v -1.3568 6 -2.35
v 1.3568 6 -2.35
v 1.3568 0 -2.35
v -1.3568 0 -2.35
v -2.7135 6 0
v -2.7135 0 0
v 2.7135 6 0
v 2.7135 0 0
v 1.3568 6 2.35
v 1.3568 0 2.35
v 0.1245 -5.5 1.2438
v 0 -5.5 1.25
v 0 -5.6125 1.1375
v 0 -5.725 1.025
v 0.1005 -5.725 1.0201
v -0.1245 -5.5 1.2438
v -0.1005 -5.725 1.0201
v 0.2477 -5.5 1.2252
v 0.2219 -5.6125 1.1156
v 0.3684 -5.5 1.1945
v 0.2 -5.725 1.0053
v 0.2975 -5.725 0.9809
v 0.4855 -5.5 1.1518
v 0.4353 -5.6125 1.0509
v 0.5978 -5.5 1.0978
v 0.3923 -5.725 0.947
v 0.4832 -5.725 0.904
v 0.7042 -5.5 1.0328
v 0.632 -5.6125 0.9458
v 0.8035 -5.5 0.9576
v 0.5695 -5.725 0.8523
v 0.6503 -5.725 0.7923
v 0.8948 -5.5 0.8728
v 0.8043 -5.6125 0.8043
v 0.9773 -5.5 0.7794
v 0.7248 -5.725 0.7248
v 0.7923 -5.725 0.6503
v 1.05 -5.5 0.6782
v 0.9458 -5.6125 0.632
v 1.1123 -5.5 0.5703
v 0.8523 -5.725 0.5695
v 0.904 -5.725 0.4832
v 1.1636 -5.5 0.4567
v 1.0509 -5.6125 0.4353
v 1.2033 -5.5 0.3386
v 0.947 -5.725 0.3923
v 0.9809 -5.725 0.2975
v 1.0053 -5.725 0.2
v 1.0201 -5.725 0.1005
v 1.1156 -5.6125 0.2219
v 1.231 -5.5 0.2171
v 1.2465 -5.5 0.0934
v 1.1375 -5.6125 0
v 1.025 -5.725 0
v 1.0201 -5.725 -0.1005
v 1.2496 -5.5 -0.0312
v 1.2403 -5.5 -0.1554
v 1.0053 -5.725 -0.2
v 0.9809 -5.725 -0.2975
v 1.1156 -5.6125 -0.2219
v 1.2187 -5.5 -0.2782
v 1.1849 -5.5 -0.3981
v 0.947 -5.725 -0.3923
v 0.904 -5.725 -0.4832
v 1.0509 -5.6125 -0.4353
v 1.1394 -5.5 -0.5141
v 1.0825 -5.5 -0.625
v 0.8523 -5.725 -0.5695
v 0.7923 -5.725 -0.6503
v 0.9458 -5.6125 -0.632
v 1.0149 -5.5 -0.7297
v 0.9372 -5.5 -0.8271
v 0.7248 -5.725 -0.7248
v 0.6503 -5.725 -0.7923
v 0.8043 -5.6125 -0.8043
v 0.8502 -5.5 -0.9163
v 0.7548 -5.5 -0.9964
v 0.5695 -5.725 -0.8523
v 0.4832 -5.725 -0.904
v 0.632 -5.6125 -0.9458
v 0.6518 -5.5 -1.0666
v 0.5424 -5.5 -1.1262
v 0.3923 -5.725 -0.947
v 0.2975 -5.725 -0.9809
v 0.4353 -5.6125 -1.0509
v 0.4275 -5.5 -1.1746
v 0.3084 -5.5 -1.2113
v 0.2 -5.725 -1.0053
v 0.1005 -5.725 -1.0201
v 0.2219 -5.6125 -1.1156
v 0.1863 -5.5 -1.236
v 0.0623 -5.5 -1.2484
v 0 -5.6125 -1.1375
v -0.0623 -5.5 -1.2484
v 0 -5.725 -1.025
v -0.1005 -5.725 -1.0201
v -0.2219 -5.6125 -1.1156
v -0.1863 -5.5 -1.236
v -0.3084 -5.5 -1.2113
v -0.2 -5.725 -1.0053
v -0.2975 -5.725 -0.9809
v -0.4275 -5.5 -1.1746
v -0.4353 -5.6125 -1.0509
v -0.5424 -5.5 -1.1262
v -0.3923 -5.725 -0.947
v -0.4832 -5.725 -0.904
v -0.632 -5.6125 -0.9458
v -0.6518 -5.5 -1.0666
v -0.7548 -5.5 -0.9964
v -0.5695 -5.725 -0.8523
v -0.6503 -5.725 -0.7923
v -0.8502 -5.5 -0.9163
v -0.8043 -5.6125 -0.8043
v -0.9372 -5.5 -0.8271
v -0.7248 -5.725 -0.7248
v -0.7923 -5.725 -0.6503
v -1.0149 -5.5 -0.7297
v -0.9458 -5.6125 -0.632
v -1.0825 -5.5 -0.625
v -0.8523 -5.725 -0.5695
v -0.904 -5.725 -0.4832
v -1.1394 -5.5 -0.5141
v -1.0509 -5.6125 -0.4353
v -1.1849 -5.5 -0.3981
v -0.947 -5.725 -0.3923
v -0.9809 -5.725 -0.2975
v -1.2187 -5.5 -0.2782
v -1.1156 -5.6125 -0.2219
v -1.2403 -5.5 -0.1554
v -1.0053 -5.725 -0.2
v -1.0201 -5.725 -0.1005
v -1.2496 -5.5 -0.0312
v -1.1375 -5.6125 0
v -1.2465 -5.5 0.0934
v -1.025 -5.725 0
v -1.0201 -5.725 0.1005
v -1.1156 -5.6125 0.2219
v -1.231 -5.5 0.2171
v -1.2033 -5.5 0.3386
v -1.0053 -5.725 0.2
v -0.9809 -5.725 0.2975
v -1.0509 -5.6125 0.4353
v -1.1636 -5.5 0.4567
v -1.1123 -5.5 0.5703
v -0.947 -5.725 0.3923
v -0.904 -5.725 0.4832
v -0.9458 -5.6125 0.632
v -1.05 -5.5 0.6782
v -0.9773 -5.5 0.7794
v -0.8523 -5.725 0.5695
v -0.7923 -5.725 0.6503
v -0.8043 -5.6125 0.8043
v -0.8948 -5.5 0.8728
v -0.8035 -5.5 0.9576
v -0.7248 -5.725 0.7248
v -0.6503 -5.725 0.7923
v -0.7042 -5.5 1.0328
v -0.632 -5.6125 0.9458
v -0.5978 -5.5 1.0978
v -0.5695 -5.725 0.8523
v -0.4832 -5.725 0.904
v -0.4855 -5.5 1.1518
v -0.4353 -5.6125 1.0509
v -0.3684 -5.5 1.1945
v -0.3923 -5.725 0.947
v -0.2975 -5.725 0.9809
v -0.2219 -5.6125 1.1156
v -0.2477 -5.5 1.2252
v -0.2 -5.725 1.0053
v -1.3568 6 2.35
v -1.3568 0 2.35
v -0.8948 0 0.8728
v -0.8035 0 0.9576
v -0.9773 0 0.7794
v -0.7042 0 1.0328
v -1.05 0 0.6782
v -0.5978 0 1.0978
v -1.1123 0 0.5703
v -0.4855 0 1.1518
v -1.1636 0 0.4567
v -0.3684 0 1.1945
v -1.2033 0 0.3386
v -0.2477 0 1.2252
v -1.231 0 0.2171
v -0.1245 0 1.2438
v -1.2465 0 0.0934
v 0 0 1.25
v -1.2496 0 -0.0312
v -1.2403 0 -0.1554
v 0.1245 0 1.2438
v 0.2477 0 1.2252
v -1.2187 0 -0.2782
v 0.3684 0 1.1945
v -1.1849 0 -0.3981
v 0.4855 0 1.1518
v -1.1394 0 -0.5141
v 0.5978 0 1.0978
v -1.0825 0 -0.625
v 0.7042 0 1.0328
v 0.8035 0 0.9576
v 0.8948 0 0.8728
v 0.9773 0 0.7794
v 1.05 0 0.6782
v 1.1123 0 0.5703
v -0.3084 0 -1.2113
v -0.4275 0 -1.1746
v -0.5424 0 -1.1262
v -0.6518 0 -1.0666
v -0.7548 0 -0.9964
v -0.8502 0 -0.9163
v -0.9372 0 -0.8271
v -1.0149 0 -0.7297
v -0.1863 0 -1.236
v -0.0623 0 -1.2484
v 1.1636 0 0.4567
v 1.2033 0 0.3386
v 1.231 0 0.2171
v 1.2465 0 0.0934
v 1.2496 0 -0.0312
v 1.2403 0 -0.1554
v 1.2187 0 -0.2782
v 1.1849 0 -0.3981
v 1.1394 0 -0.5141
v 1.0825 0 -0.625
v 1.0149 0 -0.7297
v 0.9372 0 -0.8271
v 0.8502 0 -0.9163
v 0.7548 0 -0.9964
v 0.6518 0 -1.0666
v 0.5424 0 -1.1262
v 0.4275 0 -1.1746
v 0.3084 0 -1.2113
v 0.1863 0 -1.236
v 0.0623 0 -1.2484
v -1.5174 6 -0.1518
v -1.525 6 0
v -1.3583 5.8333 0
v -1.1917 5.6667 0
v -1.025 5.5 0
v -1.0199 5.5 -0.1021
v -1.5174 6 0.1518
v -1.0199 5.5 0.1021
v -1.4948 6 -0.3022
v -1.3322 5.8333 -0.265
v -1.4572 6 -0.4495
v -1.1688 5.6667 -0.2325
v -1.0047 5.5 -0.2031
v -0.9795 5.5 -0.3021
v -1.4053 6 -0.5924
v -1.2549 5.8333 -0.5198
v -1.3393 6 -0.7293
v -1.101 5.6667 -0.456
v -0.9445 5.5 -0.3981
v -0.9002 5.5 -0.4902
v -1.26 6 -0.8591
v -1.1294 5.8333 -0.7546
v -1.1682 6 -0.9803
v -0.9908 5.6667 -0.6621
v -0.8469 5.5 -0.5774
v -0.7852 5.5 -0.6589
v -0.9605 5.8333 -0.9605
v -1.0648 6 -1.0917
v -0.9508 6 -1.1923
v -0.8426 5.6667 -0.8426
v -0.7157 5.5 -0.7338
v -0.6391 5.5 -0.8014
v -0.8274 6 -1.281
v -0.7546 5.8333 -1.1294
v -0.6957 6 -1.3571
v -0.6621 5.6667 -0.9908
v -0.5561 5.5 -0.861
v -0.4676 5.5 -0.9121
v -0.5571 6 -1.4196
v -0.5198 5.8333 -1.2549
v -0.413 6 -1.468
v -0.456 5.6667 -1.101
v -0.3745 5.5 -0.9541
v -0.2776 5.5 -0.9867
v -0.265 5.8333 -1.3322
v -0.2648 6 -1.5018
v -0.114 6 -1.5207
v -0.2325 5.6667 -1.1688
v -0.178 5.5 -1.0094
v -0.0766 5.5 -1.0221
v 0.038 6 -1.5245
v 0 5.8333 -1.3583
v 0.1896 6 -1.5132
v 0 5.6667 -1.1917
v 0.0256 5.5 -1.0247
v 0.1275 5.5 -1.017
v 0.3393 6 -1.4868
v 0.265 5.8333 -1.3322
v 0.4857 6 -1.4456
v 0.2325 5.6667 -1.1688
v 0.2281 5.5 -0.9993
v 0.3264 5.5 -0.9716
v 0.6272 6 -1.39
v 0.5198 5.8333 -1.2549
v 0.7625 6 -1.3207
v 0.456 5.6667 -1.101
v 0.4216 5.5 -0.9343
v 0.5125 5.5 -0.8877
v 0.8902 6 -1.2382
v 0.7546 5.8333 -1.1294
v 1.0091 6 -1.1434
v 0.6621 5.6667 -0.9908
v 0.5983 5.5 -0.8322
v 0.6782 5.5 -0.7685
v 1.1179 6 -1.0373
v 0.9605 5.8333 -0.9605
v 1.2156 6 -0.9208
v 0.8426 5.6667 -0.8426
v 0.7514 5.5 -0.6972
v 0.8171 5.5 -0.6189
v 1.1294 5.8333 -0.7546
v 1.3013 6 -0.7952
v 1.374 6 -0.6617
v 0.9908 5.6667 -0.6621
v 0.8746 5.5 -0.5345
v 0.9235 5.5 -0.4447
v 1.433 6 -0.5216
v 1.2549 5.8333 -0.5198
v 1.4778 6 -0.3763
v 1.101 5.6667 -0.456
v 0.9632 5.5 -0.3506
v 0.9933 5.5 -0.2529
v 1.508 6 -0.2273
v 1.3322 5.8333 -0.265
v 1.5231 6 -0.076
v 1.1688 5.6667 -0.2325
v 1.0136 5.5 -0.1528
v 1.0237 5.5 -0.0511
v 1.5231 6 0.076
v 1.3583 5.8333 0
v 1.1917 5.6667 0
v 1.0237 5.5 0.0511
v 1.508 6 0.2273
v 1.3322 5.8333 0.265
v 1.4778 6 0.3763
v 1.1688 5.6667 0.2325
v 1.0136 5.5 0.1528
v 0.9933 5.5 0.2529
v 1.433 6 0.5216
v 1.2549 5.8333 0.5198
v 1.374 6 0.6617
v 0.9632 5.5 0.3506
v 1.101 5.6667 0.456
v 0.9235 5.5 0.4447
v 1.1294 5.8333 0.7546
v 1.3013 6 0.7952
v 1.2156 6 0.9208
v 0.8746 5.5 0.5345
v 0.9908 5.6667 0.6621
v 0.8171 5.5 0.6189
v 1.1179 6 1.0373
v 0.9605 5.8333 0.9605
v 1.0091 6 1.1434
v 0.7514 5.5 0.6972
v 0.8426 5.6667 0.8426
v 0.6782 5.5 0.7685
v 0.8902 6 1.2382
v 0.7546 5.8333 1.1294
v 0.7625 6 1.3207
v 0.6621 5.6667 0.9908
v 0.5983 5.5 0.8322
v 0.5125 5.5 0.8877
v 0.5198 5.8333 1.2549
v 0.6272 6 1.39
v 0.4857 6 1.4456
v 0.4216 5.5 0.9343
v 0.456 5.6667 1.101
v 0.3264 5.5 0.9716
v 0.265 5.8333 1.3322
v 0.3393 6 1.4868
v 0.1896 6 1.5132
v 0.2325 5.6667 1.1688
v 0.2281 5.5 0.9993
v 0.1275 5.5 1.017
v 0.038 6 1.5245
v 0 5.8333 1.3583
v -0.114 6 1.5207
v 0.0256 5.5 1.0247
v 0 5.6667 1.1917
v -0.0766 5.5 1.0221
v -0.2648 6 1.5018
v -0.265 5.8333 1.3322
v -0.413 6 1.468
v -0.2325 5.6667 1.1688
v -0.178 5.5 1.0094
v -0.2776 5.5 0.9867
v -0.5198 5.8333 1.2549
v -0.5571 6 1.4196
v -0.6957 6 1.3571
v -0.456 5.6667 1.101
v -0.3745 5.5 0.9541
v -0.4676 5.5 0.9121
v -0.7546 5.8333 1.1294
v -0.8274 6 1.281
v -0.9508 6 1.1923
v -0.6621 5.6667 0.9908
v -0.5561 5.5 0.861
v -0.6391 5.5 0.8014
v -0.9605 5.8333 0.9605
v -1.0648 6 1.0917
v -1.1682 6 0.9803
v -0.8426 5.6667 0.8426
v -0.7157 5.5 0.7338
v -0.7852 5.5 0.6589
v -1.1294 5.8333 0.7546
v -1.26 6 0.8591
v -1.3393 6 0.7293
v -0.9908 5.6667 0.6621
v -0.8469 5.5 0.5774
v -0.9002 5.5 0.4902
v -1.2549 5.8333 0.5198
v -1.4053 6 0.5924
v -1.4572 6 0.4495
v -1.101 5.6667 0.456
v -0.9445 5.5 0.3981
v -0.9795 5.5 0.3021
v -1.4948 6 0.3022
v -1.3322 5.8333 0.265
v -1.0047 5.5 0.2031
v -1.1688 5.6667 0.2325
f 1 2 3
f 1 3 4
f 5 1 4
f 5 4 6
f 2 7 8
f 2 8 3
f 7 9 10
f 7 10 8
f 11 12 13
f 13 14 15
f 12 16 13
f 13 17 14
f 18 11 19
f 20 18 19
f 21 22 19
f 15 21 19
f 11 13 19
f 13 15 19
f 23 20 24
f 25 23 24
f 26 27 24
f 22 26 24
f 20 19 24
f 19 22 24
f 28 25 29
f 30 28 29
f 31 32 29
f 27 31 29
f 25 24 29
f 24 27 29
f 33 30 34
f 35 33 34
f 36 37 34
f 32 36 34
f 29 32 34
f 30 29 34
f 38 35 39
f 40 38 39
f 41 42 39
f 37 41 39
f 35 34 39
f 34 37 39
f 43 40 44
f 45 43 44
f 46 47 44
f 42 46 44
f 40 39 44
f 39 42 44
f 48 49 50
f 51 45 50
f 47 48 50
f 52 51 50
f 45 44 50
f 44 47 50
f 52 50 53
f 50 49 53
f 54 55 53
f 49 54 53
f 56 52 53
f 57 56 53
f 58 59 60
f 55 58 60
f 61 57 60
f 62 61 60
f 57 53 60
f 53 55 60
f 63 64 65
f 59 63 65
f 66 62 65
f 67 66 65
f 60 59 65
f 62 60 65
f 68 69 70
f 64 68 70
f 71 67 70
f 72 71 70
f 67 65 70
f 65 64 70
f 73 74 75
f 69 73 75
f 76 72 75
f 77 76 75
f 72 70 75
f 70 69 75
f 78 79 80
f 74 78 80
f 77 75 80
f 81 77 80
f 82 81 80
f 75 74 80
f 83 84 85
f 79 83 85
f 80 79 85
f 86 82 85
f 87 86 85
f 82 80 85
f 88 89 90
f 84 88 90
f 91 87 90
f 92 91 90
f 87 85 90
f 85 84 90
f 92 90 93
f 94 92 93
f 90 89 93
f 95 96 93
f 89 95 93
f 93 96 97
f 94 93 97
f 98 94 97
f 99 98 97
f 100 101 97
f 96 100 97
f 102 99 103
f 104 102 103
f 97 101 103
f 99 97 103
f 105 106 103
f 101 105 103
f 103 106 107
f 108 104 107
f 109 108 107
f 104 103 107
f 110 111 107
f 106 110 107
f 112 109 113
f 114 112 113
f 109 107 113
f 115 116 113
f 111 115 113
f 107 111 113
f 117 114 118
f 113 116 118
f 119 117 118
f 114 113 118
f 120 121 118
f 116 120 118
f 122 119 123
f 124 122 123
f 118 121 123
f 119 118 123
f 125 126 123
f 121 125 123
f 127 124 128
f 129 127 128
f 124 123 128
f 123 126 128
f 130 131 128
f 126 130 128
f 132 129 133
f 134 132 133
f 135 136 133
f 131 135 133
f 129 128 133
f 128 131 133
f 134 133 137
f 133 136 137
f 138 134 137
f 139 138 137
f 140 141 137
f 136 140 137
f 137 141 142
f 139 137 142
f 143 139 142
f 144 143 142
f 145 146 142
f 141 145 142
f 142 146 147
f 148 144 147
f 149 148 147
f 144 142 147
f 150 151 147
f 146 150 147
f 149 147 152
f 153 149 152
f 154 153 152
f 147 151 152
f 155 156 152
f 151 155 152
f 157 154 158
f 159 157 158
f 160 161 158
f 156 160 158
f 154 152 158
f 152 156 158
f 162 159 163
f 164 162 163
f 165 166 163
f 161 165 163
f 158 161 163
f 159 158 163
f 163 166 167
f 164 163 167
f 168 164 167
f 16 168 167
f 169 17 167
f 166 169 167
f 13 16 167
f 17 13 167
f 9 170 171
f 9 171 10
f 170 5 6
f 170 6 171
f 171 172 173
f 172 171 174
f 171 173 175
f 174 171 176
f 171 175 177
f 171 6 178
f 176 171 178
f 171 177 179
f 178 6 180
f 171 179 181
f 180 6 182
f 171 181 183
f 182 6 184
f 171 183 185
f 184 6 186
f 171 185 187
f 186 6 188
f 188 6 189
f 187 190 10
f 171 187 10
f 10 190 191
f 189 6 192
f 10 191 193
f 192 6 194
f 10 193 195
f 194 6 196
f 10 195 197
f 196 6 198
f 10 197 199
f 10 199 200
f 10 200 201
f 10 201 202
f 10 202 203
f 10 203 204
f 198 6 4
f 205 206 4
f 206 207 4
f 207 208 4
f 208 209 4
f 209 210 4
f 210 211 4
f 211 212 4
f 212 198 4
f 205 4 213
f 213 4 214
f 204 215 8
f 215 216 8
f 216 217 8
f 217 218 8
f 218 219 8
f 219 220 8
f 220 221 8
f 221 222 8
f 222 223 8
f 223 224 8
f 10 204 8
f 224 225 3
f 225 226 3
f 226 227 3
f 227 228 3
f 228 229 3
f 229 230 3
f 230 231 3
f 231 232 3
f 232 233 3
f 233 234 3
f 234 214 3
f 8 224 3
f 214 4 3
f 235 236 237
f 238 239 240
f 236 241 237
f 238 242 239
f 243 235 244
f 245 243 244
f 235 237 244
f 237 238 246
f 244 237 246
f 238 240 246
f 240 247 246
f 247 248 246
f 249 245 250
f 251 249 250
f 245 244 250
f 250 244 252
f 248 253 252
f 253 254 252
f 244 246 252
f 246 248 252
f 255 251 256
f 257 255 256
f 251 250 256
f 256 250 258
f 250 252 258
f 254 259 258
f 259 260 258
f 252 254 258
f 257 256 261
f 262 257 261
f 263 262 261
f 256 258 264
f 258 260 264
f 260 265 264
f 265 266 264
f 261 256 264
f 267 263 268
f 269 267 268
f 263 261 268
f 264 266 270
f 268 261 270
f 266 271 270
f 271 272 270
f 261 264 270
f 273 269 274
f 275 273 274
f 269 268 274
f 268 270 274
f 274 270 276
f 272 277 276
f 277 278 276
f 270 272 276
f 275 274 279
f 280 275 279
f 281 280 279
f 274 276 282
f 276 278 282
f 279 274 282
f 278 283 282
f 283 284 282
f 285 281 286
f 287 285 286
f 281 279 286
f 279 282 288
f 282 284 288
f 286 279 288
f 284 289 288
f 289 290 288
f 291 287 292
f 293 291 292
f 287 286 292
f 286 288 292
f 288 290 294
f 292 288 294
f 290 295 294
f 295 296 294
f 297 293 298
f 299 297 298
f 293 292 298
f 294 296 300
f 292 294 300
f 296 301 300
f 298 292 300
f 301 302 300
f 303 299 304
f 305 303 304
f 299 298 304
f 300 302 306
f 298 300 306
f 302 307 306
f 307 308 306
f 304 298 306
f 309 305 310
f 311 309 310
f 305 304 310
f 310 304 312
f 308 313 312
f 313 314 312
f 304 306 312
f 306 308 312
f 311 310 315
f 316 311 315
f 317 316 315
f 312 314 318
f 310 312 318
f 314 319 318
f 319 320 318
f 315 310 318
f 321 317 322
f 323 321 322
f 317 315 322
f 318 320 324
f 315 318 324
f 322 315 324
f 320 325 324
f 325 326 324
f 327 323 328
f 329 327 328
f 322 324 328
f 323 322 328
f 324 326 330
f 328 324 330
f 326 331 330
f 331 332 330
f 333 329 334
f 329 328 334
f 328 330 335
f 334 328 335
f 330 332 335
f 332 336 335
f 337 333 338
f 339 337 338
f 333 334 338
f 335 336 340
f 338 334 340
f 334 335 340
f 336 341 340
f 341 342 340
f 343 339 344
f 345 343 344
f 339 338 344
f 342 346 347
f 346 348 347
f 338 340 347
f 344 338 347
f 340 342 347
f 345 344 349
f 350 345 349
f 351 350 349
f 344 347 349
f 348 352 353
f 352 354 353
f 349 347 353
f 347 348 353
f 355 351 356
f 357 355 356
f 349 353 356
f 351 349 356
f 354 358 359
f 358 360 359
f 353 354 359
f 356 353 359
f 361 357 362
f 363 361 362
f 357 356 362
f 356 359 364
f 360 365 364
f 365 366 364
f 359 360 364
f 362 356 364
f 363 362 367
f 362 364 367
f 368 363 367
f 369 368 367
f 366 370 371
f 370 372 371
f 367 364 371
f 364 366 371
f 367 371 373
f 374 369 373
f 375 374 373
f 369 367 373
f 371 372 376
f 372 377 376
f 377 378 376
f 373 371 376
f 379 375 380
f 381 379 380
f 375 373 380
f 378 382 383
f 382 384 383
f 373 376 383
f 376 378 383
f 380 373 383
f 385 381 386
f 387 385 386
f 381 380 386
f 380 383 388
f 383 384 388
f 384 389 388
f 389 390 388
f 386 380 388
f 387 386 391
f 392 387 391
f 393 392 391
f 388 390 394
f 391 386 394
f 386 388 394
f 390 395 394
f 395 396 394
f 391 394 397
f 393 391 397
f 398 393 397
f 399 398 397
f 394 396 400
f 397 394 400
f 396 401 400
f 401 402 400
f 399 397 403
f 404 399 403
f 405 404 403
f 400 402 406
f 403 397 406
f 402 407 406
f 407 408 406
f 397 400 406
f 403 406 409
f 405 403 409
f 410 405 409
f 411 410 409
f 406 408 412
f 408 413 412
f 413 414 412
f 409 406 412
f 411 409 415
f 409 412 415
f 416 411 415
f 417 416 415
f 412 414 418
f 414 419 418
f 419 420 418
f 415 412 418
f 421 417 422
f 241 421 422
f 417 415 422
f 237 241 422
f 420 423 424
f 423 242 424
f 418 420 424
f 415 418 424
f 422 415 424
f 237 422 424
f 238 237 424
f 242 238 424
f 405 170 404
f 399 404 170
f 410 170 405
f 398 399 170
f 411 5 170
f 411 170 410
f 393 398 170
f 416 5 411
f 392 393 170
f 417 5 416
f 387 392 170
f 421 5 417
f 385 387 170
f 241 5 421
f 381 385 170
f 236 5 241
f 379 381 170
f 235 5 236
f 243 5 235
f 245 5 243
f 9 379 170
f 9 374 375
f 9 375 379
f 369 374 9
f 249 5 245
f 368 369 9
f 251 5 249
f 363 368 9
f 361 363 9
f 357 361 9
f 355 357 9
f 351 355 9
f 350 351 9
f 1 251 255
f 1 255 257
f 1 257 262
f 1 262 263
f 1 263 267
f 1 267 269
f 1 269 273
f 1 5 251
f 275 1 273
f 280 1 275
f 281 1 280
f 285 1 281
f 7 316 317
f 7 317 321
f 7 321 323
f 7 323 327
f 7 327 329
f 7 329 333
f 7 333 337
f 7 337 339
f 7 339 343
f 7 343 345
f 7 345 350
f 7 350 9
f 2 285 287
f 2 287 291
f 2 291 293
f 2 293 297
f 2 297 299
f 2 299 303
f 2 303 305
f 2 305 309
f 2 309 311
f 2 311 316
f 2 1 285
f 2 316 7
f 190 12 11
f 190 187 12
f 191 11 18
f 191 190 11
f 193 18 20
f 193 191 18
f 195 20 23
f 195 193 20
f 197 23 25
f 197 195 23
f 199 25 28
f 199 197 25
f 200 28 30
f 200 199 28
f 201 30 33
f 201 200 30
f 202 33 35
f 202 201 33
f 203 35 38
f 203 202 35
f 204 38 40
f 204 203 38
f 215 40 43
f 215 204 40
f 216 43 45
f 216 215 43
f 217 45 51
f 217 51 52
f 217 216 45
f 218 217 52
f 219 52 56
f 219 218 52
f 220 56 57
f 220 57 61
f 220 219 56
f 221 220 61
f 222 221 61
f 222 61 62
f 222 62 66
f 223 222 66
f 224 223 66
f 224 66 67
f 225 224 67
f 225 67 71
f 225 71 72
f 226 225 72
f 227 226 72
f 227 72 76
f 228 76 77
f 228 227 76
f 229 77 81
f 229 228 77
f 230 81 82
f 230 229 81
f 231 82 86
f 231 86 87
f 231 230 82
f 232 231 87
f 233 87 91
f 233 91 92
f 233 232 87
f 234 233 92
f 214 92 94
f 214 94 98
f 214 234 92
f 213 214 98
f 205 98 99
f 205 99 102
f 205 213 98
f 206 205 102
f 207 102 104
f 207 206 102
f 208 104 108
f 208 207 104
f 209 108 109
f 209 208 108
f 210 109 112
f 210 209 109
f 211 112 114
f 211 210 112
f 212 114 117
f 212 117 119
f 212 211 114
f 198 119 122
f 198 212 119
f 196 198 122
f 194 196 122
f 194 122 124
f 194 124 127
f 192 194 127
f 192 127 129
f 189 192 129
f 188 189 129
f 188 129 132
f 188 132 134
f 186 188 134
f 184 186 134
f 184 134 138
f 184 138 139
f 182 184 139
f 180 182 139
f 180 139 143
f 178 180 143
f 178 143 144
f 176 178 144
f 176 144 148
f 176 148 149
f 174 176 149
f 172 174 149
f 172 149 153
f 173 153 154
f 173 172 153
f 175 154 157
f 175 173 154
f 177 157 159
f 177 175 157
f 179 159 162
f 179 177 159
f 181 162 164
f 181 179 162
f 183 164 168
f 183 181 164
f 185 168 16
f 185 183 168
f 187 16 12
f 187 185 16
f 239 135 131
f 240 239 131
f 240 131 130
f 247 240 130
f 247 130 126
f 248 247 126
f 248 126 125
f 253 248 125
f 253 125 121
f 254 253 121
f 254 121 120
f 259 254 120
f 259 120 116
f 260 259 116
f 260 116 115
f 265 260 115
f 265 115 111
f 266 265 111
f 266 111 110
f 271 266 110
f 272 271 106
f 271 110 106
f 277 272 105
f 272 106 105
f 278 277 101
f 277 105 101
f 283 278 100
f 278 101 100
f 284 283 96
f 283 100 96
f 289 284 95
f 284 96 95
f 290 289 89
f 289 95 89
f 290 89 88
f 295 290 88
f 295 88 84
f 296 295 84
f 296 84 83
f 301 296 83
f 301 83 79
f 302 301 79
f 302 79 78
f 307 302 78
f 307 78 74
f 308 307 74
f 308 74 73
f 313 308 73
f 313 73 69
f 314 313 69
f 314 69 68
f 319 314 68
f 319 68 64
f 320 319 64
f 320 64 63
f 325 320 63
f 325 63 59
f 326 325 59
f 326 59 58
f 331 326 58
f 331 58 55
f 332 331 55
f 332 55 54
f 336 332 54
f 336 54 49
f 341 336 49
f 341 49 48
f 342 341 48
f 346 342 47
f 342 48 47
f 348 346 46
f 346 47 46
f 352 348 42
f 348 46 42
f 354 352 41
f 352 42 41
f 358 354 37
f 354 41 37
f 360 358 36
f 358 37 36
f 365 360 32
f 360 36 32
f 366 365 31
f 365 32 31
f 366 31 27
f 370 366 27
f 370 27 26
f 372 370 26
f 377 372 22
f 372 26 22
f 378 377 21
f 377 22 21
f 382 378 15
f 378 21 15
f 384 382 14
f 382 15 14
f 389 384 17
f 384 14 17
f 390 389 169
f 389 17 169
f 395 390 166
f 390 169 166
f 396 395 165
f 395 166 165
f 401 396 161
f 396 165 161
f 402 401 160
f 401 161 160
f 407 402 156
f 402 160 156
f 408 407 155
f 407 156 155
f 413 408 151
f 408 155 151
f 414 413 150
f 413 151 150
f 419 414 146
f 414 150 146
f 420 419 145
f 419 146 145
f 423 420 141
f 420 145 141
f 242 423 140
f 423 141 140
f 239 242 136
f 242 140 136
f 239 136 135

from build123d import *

# Parameters (mm, degrees)
BOSS_EXTRUDE1_DEPTH                = 6
SKETCH2_W                          = 1.25
SKETCH2_H                          = 6
TAP_DRILL_FOR_M2_5X0_45_TAP1_D     = 2.05
TAP_DRILL_FOR_M2_5X0_45_TAP1_DEPTH = 19
CHAMFER1_SIZE                      = 0.5


with BuildPart() as part:
    # Sketch1 → Boss-Extrude1 (new body)
    with BuildSketch(Plane(origin=(0, 6, 0), x_dir=(1, 0, 0), z_dir=(0, 1, 0))):
        Polygon((1.356773133, -2.35), (2.713546265, 0), (1.356773133, 2.35), (-1.356773133, 2.35), (-2.713546265, 0), (-1.356773133, -2.35), align=None)
    extrude(amount=-BOSS_EXTRUDE1_DEPTH)

    # Sketch2 → Revolve1 (revolve)
    with BuildSketch(Plane(origin=(0, 0, 0), x_dir=(-1, 0, 0), z_dir=(0, 0, -1)), mode=Mode.PRIVATE) as revolve1_sk:
        with Locations((-0.625, -3)):
            Rectangle(SKETCH2_W, SKETCH2_H)
    revolve(revolve1_sk.sketch.rotate(Axis((0, -6, 0), (0, 1, 0)), 270), axis=Axis((0, -6, 0), (0, 1, 0)))

    # Tap Drill for M2.5x0.45 Tap1
    with Locations(Plane(origin=(0, 6, 0), x_dir=(1, 0, 0), z_dir=(0, 1, 0))):
        with Locations((0, 0)):
            Hole(TAP_DRILL_FOR_M2_5X0_45_TAP1_D / 2, depth=TAP_DRILL_FOR_M2_5X0_45_TAP1_DEPTH)

    # Chamfer1
    # the kernel refuses this chamfer: 0.5 mm, written as the material it takes off along each edge
    with BuildSketch(Plane(origin=(0, -6, 0), x_dir=(0, 0, 1), z_dir=(-1, 0, 0))) as chamfer1_piece_1:
        Polygon((1.25, CHAMFER1_SIZE), (1.25 - CHAMFER1_SIZE, 0), (1.25, 0), align=None)
    revolve(axis=Axis((0, -6, 0), (0, 1, 0)), mode=Mode.SUBTRACT)
    with BuildSketch(Plane(origin=(0, 6, 0), x_dir=(-1, 0, 0), z_dir=(0, 0, 1))) as chamfer1_piece_2:
        Polygon((1.025 + CHAMFER1_SIZE, 0), (1.025, CHAMFER1_SIZE), (1.025, 0), align=None)
    revolve(axis=Axis((0, 6, 0), (0, -1, 0)), mode=Mode.SUBTRACT)


solid = part.part
